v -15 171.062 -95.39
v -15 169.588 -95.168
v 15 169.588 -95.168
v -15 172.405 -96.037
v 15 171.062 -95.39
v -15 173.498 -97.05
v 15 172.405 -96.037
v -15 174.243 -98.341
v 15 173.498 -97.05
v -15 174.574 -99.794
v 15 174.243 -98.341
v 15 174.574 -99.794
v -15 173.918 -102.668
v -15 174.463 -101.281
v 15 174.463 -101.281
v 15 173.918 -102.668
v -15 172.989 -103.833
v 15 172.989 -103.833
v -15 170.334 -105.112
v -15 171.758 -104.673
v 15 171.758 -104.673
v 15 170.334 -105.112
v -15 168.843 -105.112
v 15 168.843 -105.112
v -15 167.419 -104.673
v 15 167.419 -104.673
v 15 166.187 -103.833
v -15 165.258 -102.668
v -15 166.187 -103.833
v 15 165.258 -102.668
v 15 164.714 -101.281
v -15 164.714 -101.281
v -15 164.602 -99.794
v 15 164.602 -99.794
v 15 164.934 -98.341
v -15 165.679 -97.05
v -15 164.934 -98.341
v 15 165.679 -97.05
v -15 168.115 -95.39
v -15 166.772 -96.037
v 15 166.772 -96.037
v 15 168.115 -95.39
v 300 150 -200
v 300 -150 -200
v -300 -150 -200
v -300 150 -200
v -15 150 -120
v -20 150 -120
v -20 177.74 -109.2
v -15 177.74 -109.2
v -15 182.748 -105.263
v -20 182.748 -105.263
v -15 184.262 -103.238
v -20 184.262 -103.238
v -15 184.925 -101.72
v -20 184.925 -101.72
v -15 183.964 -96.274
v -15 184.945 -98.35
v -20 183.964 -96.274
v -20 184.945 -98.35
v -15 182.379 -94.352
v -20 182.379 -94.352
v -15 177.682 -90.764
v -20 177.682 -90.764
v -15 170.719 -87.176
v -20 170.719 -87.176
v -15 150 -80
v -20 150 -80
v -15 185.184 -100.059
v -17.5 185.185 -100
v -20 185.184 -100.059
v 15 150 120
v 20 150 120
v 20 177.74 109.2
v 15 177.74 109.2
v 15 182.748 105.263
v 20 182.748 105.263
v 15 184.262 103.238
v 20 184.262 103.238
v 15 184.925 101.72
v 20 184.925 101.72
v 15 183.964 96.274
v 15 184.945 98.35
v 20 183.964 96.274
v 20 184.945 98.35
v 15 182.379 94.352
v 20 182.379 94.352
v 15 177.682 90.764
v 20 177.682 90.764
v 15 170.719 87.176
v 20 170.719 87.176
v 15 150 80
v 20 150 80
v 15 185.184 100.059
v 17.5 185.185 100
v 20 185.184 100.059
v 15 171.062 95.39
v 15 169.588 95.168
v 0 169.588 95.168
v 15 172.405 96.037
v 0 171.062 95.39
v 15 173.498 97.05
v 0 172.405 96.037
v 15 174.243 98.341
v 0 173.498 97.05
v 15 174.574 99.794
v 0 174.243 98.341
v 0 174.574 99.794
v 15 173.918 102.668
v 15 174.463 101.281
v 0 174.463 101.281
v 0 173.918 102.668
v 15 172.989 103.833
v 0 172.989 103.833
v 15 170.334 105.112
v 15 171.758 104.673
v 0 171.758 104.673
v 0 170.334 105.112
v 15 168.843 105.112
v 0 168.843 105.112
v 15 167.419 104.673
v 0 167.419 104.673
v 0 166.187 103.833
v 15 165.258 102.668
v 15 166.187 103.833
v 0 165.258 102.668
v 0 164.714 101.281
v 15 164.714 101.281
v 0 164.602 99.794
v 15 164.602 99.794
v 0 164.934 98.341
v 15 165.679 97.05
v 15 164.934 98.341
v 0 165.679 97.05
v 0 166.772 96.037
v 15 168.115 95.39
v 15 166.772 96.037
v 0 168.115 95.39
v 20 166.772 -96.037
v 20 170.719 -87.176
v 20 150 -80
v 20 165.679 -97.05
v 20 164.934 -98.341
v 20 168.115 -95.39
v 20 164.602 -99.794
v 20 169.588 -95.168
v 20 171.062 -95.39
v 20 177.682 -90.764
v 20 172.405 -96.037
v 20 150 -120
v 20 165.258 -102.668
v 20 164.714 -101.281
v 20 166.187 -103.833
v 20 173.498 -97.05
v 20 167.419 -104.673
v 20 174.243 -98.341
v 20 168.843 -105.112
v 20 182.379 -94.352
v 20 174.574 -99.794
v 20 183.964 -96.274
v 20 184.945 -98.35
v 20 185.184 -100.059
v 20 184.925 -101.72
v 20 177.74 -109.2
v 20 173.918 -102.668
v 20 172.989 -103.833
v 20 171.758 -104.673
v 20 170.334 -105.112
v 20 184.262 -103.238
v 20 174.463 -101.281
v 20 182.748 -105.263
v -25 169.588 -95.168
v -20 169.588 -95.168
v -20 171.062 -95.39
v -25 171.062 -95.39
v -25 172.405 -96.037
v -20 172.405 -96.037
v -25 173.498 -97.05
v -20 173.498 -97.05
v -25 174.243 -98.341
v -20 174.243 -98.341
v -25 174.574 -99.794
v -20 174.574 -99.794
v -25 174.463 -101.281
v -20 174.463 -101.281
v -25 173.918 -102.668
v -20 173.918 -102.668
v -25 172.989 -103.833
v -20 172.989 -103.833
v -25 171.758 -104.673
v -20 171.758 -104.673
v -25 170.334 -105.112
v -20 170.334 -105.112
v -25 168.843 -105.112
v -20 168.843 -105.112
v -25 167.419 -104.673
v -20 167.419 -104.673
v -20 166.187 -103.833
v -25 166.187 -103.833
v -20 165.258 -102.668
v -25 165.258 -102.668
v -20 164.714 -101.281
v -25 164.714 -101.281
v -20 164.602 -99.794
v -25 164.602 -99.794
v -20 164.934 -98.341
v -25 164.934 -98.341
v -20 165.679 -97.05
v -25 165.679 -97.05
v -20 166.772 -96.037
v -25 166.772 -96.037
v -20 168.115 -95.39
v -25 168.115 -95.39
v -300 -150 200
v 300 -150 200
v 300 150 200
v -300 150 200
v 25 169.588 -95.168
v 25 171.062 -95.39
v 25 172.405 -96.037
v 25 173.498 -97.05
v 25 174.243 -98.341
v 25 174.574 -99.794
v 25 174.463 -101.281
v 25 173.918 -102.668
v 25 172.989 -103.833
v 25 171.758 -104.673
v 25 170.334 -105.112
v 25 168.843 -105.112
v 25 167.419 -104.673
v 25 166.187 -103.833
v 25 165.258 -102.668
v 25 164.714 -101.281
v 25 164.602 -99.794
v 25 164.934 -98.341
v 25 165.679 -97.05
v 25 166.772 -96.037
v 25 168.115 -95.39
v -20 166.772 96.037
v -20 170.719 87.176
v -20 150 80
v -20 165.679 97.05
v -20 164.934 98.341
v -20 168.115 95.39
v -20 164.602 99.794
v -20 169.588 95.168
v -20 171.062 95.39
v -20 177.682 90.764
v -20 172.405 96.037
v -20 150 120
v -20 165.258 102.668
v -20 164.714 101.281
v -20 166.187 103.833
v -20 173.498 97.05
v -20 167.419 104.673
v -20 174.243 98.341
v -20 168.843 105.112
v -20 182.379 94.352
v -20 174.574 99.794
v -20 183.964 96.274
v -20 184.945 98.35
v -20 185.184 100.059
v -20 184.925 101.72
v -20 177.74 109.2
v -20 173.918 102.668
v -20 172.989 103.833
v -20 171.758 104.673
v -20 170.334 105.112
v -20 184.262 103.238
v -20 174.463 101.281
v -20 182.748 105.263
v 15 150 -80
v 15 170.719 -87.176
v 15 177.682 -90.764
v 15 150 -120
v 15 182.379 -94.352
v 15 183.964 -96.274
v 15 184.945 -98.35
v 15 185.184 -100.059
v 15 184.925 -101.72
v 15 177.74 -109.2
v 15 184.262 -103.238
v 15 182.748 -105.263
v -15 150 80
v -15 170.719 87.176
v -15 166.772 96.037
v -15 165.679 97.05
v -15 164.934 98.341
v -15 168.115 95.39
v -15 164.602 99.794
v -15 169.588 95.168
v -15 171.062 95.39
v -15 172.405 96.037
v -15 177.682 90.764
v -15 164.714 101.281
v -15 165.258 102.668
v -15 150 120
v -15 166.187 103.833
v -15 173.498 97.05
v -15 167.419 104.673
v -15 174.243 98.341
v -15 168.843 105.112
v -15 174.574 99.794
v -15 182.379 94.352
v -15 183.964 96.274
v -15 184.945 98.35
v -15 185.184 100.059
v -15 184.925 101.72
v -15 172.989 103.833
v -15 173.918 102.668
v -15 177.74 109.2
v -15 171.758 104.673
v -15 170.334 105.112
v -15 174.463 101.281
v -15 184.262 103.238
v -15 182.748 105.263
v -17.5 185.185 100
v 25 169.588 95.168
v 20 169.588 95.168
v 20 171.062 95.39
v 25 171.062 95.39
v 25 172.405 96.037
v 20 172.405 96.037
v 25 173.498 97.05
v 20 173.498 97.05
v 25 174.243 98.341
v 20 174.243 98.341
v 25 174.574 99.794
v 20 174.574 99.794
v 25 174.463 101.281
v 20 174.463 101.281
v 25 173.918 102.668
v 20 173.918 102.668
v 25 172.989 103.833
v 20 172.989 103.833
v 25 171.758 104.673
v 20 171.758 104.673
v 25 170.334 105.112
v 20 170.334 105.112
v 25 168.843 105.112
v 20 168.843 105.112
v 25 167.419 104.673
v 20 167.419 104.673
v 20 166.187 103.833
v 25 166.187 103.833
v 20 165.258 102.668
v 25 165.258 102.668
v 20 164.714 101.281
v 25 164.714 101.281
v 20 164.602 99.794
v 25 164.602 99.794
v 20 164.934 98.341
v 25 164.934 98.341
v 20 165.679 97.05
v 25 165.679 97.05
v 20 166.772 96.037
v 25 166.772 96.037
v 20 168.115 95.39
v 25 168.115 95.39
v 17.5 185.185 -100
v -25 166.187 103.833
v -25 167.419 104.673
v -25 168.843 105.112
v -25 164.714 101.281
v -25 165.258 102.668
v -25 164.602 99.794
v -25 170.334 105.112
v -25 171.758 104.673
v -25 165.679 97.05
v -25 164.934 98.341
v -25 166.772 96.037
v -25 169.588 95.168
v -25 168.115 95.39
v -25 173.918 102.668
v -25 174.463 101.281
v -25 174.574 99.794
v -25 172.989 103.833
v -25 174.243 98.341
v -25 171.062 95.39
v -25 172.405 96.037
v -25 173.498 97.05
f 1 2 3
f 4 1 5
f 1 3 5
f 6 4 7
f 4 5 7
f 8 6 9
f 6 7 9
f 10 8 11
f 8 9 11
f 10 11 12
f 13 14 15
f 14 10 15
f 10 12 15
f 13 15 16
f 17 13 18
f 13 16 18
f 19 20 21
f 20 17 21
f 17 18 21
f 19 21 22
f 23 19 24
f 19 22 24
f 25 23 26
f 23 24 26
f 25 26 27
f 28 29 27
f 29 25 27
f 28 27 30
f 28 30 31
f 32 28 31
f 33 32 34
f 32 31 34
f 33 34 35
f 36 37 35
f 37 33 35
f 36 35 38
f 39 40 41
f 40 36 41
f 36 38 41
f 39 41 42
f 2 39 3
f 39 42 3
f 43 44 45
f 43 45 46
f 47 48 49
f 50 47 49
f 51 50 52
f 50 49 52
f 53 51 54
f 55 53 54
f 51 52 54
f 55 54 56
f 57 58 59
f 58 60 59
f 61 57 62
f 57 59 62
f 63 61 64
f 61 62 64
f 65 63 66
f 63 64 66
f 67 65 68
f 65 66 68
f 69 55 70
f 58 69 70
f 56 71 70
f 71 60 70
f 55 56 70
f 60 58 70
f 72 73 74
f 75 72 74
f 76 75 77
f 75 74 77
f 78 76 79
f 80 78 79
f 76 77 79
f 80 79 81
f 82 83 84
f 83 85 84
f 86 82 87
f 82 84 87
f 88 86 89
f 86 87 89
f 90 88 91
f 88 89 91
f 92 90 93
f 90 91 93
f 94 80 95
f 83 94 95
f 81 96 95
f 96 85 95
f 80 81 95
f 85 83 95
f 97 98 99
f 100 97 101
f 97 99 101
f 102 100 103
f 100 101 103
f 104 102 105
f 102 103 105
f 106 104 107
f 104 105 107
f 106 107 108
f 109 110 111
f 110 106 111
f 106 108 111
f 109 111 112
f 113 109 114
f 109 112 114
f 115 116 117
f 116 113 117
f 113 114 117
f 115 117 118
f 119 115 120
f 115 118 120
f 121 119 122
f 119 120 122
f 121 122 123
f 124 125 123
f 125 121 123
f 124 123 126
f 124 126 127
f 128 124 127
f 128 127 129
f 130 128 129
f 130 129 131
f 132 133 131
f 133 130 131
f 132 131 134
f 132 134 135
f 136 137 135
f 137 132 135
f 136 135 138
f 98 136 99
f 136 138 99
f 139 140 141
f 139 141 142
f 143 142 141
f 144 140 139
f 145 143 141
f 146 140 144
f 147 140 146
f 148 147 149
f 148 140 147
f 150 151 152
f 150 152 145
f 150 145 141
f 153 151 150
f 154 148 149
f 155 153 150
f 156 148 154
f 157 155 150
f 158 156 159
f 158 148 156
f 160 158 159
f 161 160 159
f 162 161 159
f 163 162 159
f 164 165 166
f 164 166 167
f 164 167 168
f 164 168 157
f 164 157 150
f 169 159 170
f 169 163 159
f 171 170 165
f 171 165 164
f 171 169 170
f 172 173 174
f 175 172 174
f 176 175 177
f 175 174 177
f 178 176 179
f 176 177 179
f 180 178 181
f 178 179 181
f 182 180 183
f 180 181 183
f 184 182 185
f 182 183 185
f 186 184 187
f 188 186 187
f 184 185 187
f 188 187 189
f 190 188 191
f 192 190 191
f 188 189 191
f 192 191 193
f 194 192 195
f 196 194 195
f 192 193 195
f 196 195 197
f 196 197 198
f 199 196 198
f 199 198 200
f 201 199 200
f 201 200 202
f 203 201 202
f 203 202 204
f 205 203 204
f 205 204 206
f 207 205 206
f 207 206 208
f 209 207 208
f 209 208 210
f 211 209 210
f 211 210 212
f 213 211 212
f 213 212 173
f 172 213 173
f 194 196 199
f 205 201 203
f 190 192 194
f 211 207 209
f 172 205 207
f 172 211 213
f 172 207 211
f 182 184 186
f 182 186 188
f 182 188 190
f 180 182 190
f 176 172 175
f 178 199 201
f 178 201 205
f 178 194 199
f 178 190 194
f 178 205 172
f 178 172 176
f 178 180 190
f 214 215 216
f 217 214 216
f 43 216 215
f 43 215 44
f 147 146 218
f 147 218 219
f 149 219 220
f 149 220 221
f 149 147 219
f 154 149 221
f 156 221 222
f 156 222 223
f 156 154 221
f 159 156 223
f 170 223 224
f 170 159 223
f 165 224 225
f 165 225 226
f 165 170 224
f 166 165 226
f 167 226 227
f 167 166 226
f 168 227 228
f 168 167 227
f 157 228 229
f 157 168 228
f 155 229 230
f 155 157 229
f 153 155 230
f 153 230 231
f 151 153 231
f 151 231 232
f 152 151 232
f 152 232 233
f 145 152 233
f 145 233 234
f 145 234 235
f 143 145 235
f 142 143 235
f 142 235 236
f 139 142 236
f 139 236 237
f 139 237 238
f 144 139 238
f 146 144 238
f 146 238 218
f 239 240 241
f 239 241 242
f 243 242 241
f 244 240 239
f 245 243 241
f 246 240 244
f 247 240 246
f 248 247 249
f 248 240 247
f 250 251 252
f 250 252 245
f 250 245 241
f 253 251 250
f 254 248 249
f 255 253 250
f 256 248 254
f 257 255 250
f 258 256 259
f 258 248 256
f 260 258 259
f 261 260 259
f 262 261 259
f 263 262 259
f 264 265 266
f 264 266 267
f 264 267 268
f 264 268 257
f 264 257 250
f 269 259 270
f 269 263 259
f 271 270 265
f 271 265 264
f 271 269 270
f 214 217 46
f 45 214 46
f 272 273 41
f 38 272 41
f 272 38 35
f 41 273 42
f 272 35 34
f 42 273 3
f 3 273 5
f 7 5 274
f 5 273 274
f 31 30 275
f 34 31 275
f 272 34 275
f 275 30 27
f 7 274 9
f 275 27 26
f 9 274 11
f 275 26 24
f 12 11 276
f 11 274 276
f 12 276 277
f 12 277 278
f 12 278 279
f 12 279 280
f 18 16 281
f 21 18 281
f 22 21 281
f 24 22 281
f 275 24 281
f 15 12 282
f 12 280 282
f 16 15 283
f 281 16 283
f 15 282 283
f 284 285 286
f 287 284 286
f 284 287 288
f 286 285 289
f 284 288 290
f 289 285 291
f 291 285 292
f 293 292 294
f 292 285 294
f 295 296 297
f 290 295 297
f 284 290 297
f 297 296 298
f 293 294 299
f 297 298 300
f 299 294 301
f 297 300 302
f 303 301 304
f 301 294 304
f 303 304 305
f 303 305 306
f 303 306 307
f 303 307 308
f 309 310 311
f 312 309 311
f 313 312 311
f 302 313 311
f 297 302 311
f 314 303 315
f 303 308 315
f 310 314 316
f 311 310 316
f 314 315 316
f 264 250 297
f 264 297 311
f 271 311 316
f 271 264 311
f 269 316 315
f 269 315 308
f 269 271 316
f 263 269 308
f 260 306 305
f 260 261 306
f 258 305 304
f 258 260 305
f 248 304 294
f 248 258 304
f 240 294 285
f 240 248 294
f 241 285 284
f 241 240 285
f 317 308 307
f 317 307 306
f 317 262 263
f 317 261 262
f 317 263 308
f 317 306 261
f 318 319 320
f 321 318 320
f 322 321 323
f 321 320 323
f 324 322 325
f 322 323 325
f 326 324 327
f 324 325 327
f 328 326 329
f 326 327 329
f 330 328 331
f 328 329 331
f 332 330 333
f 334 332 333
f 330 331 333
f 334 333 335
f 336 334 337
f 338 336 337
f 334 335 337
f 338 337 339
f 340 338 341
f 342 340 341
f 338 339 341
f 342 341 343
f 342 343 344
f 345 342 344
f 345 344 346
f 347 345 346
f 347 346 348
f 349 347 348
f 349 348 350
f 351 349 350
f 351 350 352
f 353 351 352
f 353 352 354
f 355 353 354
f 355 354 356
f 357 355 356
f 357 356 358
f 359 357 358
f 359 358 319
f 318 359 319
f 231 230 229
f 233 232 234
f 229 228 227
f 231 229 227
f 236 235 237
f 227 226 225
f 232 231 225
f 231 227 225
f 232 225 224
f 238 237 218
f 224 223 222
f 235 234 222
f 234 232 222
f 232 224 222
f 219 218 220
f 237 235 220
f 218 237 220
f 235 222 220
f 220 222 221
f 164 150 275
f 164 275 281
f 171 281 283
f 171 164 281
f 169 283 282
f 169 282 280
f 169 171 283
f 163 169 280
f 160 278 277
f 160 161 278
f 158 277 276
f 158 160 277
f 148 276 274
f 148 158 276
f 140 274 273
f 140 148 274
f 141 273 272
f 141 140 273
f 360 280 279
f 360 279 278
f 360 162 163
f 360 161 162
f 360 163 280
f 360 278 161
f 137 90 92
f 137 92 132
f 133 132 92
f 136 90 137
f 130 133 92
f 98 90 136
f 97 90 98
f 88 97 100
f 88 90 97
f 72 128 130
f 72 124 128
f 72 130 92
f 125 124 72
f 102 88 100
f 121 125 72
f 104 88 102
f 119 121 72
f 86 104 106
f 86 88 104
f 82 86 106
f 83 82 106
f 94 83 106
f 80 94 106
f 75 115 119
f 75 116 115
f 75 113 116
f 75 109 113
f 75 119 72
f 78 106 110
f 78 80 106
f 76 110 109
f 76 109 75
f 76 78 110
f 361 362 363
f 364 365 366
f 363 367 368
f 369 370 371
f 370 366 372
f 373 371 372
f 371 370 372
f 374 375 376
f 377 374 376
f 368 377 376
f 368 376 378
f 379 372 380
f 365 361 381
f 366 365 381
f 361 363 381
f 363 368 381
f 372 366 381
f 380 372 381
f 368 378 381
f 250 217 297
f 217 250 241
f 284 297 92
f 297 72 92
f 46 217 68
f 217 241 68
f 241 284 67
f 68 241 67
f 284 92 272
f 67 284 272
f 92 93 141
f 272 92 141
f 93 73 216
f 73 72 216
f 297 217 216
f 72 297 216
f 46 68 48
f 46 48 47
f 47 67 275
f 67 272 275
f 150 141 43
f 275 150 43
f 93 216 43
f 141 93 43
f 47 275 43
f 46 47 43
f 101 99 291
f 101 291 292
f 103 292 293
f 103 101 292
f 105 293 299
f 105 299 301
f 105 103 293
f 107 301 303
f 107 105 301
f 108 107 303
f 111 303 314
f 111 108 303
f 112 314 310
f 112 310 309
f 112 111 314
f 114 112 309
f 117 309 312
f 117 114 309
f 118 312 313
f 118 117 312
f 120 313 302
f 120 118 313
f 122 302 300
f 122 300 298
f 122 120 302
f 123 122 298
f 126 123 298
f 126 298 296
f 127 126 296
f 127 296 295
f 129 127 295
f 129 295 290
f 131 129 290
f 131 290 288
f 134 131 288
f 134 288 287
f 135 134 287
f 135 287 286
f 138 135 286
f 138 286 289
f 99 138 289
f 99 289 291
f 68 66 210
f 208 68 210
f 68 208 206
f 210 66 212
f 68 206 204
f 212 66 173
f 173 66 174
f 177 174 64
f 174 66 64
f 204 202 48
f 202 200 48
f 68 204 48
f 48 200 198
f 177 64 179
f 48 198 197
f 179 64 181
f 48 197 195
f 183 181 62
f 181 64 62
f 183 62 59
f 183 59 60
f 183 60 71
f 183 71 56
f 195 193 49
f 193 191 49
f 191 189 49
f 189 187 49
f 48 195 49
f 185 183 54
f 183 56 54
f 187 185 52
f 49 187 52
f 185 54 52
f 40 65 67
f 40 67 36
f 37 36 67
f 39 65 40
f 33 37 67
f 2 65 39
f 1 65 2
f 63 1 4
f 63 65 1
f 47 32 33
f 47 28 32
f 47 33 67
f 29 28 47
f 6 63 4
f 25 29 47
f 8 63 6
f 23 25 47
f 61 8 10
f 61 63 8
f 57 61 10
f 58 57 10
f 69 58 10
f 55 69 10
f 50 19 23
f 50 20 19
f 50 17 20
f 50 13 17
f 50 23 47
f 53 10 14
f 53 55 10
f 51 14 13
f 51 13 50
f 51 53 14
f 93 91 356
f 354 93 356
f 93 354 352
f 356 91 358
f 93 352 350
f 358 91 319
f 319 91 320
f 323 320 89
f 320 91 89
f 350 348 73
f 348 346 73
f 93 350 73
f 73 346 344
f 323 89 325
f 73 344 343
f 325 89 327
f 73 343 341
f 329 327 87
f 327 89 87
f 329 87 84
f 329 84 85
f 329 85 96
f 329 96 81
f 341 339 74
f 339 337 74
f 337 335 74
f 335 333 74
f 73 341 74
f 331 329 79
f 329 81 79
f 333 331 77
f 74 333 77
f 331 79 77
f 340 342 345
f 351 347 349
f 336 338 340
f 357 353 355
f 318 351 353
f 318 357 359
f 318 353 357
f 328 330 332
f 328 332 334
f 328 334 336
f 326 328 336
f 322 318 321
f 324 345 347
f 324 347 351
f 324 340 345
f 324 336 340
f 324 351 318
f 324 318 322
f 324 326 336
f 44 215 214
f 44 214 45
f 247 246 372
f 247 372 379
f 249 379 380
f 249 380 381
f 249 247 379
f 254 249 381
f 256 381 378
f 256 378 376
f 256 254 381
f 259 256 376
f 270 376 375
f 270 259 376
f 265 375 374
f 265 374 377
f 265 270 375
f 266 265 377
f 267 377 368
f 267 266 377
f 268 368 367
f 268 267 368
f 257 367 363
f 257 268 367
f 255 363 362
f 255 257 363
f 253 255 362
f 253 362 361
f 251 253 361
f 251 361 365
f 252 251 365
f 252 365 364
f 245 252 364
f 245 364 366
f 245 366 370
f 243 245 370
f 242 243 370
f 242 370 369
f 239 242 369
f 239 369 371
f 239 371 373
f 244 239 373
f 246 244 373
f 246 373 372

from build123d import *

# Parameters (mm, degrees)
BOSS_EXTRUDE1_DEPTH      = 300
BOSS_EXTRUDE1_DEPTH_BACK = 300
SKETCH2_W                = 400
SKETCH2_H                = 300
BOSS_EXTRUDE4_DEPTH      = 5
BOSS_EXTRUDE5_START      = -20
SKETCH10_R               = 5
BOSS_EXTRUDE5_DEPTH      = 25
MIRROR2_COPY_1_DEPTH     = 5
MIRROR2_START            = -20
MIRROR2_COPY_2_SKETCH_R  = 5
MIRROR2_COPY_2_DEPTH     = 25


with BuildPart() as part:
    # Sketch2 → Boss-Extrude1 (new, two sides: drawn at the far end of the back side and taken through both)
    with BuildSketch(Plane(origin=(0, 0, 0), x_dir=(0, 0, -1), z_dir=(1, 0, 0)).offset(-BOSS_EXTRUDE1_DEPTH_BACK)):
        Rectangle(SKETCH2_W, SKETCH2_H)
    extrude(amount=BOSS_EXTRUDE1_DEPTH + BOSS_EXTRUDE1_DEPTH_BACK)

    # Sketch9 → Boss-Extrude4 (add)
    with BuildSketch(Plane(origin=(20, 0, 0), x_dir=(0, 0, -1), z_dir=(1, 0, 0))):
        with BuildLine():
            Line((-80, 150), (-100, 150))
            Line((-100, 150), (-120, 150))
            add(Edge.make_bspline(
                [(-120, 150), (-100, 220.369583086), (-80, 150)],
                knots=[0, 0, 0, 1, 1, 1], degree=2))
        make_face()
    boss_extrude4 = extrude(amount=-BOSS_EXTRUDE4_DEPTH)

    # Sketch10 → Boss-Extrude5 (add)
    with BuildSketch(Plane(origin=(20, 0, 0), x_dir=(0, 0, -1), z_dir=(1, 0, 0)).offset(BOSS_EXTRUDE5_START)):
        with Locations((-100.167931578, 169.588362033)):
            Circle(SKETCH10_R)
    boss_extrude5 = extrude(amount=BOSS_EXTRUDE5_DEPTH)

    # Mirror1: Boss-Extrude4, Boss-Extrude5 across plane
    add(boss_extrude4.mirror(Plane(origin=(0, 0, 0), x_dir=(0, 0, 1), z_dir=(1, 0, 0))))
    add(boss_extrude5.mirror(Plane(origin=(0, 0, 0), x_dir=(0, 0, 1), z_dir=(1, 0, 0))))

    # Mirror2: Boss-Extrude4, Boss-Extrude5 across plane
    add(boss_extrude4.mirror(Plane.XY))
    add(boss_extrude5.mirror(Plane.XY))

    # Mirror2 copy 1 sketch → Mirror2 copy 1 (add)
    with BuildSketch(Plane.ZY.offset(20)):
        with BuildLine():
            Line((-80, 150), (-100, 150))
            Line((-100, 150), (-120, 150))
            add(Edge.make_bspline(
                [(-120, 150), (-100, 220.369583086), (-80, 150)],
                knots=[0, 0, 0, 1, 1, 1], degree=2))
        make_face()
    extrude(amount=-MIRROR2_COPY_1_DEPTH)

    # Mirror2 copy 2 sketch → Mirror2 copy 2 (add)
    with BuildSketch(Plane.ZY.offset(20).offset(MIRROR2_START)):
        with Locations((-100.167931578, 169.588362033)):
            Circle(MIRROR2_COPY_2_SKETCH_R)
    extrude(amount=MIRROR2_COPY_2_DEPTH)


solid = part.part
